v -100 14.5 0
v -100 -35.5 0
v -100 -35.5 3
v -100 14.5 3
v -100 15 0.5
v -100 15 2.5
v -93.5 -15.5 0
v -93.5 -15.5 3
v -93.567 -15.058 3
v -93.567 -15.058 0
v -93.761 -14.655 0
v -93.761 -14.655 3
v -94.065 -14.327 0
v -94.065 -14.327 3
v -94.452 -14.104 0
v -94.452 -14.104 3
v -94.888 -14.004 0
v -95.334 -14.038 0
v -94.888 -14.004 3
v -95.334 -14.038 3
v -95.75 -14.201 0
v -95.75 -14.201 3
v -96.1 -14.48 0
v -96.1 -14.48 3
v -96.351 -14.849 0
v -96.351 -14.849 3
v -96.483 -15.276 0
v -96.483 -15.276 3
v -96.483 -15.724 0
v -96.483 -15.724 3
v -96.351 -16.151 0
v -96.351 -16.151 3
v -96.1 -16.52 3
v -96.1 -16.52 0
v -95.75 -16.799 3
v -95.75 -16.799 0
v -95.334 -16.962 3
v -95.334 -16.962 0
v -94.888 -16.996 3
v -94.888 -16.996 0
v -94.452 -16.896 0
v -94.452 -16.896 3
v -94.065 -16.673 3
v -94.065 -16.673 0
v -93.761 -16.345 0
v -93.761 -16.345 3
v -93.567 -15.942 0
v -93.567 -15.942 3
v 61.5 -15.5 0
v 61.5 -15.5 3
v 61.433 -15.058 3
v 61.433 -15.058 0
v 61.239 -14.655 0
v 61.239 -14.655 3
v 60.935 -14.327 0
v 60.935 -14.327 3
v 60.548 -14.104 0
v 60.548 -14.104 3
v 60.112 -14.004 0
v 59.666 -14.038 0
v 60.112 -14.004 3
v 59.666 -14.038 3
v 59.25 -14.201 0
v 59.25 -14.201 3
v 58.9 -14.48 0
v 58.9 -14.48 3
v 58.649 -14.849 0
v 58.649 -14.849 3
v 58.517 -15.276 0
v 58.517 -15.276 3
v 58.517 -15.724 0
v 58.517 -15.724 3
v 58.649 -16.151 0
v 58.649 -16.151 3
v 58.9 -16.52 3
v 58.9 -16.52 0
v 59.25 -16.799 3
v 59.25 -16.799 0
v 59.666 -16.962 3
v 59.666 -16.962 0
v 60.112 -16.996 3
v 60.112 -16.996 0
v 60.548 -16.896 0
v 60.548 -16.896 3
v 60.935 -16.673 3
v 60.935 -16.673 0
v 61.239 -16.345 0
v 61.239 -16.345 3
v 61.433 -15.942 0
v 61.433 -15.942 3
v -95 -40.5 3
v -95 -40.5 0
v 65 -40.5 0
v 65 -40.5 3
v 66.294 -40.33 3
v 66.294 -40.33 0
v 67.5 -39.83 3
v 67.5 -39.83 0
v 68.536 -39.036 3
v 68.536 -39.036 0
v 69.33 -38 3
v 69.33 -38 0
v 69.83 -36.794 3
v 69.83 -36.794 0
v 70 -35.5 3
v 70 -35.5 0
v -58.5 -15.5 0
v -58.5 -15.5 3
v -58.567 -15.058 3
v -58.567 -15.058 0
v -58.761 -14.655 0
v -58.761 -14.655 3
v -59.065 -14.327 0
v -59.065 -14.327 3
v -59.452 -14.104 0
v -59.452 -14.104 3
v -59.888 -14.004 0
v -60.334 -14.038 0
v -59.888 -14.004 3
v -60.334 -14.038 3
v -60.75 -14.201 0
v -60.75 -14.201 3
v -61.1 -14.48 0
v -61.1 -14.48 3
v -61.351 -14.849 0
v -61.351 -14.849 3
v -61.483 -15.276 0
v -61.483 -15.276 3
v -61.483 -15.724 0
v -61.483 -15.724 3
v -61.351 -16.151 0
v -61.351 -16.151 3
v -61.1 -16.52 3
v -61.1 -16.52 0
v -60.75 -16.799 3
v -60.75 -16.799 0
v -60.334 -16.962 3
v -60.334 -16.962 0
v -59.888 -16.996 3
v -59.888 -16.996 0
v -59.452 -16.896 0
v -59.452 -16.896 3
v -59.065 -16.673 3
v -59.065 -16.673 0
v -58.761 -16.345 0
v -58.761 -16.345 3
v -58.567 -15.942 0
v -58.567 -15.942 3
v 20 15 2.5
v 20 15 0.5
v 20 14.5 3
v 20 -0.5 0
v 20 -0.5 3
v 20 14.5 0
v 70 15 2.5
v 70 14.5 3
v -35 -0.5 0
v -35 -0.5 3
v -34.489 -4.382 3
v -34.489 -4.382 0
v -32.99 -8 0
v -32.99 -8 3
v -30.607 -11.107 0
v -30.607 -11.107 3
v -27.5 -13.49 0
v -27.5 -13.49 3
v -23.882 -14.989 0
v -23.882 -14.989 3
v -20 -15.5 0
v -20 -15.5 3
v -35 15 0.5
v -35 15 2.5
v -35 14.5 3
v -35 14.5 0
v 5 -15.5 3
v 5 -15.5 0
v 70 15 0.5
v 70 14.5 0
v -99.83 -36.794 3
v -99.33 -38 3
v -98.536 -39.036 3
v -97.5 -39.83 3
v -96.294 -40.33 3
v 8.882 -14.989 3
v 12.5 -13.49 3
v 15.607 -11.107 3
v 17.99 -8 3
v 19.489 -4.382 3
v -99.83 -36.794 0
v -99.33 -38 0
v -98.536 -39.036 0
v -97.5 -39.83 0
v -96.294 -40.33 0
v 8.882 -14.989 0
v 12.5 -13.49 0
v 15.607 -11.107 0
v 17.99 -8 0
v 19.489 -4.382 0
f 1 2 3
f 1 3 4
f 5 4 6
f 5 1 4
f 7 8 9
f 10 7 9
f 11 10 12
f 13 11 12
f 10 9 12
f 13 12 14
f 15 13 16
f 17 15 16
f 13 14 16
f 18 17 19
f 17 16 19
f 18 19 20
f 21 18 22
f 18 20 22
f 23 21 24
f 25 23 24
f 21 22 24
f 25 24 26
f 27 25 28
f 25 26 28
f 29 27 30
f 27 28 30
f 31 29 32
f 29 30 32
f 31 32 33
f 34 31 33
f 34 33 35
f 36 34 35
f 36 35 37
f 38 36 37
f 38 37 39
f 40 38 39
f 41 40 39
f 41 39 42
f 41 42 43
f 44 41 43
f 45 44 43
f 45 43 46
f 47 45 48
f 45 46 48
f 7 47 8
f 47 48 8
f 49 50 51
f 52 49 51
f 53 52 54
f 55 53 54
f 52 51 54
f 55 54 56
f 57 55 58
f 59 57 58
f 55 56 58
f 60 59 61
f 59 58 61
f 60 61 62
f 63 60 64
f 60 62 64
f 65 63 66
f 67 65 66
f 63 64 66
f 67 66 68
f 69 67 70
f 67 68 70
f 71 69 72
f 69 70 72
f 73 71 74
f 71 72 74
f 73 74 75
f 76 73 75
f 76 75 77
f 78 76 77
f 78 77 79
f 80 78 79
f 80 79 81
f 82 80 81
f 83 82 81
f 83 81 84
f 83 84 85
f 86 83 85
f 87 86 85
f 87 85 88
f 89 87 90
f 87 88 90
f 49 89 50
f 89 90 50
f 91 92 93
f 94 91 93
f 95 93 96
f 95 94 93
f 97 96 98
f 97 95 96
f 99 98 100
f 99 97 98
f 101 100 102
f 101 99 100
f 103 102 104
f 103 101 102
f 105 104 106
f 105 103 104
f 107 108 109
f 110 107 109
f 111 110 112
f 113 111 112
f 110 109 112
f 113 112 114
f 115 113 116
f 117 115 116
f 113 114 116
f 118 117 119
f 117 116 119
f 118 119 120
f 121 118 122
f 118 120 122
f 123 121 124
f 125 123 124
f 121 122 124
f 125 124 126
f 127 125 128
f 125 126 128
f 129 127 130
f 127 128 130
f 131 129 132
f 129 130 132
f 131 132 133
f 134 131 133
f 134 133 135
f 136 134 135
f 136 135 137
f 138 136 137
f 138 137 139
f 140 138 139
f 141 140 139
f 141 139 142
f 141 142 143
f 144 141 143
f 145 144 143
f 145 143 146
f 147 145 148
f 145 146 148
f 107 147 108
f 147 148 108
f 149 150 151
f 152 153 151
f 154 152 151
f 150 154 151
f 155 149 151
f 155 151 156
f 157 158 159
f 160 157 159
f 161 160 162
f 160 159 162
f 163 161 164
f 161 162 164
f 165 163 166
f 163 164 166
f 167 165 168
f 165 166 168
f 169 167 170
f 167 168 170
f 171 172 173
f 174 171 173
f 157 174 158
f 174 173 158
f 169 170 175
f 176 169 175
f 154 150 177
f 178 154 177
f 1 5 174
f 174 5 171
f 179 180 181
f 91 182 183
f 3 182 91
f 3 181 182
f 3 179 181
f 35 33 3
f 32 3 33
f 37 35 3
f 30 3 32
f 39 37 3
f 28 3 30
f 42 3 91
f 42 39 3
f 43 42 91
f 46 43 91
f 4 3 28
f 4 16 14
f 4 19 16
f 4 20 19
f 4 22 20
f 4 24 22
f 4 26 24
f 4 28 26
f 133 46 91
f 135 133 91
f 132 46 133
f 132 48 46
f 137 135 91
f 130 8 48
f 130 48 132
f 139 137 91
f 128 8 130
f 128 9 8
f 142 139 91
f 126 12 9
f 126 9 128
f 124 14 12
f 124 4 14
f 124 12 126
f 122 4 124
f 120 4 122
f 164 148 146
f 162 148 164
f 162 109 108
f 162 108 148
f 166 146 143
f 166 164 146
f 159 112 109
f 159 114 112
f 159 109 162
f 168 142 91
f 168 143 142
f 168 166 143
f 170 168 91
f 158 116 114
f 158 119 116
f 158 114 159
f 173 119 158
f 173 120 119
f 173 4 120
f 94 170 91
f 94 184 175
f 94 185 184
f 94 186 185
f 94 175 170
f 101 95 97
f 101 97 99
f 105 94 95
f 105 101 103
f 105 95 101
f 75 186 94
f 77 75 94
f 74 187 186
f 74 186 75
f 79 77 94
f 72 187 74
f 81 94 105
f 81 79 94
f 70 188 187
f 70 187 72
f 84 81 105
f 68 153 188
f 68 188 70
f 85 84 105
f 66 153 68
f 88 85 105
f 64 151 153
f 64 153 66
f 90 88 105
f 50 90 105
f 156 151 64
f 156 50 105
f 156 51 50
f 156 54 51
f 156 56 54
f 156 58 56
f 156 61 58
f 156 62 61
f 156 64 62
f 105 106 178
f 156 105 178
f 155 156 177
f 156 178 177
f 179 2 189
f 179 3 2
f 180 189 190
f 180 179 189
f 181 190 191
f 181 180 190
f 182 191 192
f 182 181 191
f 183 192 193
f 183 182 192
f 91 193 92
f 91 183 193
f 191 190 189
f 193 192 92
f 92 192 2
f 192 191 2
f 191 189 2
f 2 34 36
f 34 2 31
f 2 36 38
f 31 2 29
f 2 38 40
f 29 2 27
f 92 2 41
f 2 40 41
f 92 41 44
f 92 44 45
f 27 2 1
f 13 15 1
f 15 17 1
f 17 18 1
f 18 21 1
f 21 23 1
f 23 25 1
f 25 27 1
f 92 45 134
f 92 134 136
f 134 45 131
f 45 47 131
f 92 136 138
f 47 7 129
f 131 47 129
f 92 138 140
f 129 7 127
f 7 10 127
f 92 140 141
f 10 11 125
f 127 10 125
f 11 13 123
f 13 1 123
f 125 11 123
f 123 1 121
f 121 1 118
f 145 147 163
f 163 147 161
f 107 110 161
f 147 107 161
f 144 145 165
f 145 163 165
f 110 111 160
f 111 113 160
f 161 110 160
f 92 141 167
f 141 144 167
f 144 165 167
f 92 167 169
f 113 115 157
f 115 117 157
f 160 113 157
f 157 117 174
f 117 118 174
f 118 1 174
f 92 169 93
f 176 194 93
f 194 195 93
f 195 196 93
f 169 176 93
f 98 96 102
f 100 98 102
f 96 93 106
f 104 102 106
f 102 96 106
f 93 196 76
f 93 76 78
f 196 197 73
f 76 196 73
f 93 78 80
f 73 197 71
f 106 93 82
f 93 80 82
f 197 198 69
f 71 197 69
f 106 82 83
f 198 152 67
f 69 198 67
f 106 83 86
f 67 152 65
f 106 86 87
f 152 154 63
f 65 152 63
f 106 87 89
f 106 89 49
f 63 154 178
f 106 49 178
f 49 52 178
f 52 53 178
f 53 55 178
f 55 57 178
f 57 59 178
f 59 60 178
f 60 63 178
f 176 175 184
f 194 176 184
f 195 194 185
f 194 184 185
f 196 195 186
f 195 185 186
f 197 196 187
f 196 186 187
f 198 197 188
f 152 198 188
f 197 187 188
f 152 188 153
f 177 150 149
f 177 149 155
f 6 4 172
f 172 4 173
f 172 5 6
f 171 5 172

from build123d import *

# Parameters (mm, degrees)
SKETCH_1_W          = 170
SKETCH_1_H          = 55.5
EXTRUDE_1_DEPTH     = 3
SKETCH_2_R          = 1.5
CUT_EXTRUDE_1_DEPTH = 3
CUT_EXTRUDE_2_DEPTH = 3
FILLET_1_R          = 5
SKETCH_4_R          = 1.5
CUT_EXTRUDE_3_DEPTH = 3
CHAMFER_1_SIZE      = 0.5


with BuildPart() as part:
    # 草图1 → 凸台-拉伸1 (new body)
    with BuildSketch(Plane.XY):
        with Locations((-15, -12.75)):
            Rectangle(SKETCH_1_W, SKETCH_1_H)
    extrude(amount=EXTRUDE_1_DEPTH)

    # 草图2 → 切除-拉伸1 (cut)
    with BuildSketch(Plane.XY.offset(3)):
        with Locations((60, -15.5)):
            Circle(SKETCH_2_R)
        with Locations((-60, -15.5)):
            Circle(SKETCH_2_R)
    extrude(amount=-CUT_EXTRUDE_1_DEPTH, mode=Mode.SUBTRACT)

    # 草图3 → 切除-拉伸2 (cut)
    with BuildSketch(Plane.XY.offset(3)):
        with BuildLine():
            Line((-20, -15.5), (5, -15.5))
            ThreePointArc((5, -15.5), (15.606601718, -11.106601718), (20, -0.5))
            Line((20, -0.5), (20, 15))
            Line((20, 15), (-35, 15))
            Line((-35, 15), (-35, -0.5))
            ThreePointArc((-35, -0.5), (-30.606601718, -11.106601718), (-20, -15.5))
        make_face()
    extrude(amount=-CUT_EXTRUDE_2_DEPTH, mode=Mode.SUBTRACT)

    # 圆角1
    fillet_1_edges = [part.edges().sort_by_distance(p)[0] for p in [
        (70, -40.5, 1.5),
        (-100, -40.5, 1.5),
    ]]
    fillet(fillet_1_edges, radius=FILLET_1_R)

    # 草图4 → 切除-拉伸3 (cut)
    with BuildSketch(Plane.XY.offset(3)):
        with Locations((-95, -15.5)):
            Circle(SKETCH_4_R)
    extrude(amount=-CUT_EXTRUDE_3_DEPTH, mode=Mode.SUBTRACT)

    # 倒角1
    chamfer_1_edges = [part.edges().sort_by_distance(p)[0] for p in [
        (45, 15, 3),
        (-67.5, 15, 0),
        (-67.5, 15, 3),
        (45, 15, 0),
    ]]
    chamfer(chamfer_1_edges, length=CHAMFER_1_SIZE)


solid = part.part
